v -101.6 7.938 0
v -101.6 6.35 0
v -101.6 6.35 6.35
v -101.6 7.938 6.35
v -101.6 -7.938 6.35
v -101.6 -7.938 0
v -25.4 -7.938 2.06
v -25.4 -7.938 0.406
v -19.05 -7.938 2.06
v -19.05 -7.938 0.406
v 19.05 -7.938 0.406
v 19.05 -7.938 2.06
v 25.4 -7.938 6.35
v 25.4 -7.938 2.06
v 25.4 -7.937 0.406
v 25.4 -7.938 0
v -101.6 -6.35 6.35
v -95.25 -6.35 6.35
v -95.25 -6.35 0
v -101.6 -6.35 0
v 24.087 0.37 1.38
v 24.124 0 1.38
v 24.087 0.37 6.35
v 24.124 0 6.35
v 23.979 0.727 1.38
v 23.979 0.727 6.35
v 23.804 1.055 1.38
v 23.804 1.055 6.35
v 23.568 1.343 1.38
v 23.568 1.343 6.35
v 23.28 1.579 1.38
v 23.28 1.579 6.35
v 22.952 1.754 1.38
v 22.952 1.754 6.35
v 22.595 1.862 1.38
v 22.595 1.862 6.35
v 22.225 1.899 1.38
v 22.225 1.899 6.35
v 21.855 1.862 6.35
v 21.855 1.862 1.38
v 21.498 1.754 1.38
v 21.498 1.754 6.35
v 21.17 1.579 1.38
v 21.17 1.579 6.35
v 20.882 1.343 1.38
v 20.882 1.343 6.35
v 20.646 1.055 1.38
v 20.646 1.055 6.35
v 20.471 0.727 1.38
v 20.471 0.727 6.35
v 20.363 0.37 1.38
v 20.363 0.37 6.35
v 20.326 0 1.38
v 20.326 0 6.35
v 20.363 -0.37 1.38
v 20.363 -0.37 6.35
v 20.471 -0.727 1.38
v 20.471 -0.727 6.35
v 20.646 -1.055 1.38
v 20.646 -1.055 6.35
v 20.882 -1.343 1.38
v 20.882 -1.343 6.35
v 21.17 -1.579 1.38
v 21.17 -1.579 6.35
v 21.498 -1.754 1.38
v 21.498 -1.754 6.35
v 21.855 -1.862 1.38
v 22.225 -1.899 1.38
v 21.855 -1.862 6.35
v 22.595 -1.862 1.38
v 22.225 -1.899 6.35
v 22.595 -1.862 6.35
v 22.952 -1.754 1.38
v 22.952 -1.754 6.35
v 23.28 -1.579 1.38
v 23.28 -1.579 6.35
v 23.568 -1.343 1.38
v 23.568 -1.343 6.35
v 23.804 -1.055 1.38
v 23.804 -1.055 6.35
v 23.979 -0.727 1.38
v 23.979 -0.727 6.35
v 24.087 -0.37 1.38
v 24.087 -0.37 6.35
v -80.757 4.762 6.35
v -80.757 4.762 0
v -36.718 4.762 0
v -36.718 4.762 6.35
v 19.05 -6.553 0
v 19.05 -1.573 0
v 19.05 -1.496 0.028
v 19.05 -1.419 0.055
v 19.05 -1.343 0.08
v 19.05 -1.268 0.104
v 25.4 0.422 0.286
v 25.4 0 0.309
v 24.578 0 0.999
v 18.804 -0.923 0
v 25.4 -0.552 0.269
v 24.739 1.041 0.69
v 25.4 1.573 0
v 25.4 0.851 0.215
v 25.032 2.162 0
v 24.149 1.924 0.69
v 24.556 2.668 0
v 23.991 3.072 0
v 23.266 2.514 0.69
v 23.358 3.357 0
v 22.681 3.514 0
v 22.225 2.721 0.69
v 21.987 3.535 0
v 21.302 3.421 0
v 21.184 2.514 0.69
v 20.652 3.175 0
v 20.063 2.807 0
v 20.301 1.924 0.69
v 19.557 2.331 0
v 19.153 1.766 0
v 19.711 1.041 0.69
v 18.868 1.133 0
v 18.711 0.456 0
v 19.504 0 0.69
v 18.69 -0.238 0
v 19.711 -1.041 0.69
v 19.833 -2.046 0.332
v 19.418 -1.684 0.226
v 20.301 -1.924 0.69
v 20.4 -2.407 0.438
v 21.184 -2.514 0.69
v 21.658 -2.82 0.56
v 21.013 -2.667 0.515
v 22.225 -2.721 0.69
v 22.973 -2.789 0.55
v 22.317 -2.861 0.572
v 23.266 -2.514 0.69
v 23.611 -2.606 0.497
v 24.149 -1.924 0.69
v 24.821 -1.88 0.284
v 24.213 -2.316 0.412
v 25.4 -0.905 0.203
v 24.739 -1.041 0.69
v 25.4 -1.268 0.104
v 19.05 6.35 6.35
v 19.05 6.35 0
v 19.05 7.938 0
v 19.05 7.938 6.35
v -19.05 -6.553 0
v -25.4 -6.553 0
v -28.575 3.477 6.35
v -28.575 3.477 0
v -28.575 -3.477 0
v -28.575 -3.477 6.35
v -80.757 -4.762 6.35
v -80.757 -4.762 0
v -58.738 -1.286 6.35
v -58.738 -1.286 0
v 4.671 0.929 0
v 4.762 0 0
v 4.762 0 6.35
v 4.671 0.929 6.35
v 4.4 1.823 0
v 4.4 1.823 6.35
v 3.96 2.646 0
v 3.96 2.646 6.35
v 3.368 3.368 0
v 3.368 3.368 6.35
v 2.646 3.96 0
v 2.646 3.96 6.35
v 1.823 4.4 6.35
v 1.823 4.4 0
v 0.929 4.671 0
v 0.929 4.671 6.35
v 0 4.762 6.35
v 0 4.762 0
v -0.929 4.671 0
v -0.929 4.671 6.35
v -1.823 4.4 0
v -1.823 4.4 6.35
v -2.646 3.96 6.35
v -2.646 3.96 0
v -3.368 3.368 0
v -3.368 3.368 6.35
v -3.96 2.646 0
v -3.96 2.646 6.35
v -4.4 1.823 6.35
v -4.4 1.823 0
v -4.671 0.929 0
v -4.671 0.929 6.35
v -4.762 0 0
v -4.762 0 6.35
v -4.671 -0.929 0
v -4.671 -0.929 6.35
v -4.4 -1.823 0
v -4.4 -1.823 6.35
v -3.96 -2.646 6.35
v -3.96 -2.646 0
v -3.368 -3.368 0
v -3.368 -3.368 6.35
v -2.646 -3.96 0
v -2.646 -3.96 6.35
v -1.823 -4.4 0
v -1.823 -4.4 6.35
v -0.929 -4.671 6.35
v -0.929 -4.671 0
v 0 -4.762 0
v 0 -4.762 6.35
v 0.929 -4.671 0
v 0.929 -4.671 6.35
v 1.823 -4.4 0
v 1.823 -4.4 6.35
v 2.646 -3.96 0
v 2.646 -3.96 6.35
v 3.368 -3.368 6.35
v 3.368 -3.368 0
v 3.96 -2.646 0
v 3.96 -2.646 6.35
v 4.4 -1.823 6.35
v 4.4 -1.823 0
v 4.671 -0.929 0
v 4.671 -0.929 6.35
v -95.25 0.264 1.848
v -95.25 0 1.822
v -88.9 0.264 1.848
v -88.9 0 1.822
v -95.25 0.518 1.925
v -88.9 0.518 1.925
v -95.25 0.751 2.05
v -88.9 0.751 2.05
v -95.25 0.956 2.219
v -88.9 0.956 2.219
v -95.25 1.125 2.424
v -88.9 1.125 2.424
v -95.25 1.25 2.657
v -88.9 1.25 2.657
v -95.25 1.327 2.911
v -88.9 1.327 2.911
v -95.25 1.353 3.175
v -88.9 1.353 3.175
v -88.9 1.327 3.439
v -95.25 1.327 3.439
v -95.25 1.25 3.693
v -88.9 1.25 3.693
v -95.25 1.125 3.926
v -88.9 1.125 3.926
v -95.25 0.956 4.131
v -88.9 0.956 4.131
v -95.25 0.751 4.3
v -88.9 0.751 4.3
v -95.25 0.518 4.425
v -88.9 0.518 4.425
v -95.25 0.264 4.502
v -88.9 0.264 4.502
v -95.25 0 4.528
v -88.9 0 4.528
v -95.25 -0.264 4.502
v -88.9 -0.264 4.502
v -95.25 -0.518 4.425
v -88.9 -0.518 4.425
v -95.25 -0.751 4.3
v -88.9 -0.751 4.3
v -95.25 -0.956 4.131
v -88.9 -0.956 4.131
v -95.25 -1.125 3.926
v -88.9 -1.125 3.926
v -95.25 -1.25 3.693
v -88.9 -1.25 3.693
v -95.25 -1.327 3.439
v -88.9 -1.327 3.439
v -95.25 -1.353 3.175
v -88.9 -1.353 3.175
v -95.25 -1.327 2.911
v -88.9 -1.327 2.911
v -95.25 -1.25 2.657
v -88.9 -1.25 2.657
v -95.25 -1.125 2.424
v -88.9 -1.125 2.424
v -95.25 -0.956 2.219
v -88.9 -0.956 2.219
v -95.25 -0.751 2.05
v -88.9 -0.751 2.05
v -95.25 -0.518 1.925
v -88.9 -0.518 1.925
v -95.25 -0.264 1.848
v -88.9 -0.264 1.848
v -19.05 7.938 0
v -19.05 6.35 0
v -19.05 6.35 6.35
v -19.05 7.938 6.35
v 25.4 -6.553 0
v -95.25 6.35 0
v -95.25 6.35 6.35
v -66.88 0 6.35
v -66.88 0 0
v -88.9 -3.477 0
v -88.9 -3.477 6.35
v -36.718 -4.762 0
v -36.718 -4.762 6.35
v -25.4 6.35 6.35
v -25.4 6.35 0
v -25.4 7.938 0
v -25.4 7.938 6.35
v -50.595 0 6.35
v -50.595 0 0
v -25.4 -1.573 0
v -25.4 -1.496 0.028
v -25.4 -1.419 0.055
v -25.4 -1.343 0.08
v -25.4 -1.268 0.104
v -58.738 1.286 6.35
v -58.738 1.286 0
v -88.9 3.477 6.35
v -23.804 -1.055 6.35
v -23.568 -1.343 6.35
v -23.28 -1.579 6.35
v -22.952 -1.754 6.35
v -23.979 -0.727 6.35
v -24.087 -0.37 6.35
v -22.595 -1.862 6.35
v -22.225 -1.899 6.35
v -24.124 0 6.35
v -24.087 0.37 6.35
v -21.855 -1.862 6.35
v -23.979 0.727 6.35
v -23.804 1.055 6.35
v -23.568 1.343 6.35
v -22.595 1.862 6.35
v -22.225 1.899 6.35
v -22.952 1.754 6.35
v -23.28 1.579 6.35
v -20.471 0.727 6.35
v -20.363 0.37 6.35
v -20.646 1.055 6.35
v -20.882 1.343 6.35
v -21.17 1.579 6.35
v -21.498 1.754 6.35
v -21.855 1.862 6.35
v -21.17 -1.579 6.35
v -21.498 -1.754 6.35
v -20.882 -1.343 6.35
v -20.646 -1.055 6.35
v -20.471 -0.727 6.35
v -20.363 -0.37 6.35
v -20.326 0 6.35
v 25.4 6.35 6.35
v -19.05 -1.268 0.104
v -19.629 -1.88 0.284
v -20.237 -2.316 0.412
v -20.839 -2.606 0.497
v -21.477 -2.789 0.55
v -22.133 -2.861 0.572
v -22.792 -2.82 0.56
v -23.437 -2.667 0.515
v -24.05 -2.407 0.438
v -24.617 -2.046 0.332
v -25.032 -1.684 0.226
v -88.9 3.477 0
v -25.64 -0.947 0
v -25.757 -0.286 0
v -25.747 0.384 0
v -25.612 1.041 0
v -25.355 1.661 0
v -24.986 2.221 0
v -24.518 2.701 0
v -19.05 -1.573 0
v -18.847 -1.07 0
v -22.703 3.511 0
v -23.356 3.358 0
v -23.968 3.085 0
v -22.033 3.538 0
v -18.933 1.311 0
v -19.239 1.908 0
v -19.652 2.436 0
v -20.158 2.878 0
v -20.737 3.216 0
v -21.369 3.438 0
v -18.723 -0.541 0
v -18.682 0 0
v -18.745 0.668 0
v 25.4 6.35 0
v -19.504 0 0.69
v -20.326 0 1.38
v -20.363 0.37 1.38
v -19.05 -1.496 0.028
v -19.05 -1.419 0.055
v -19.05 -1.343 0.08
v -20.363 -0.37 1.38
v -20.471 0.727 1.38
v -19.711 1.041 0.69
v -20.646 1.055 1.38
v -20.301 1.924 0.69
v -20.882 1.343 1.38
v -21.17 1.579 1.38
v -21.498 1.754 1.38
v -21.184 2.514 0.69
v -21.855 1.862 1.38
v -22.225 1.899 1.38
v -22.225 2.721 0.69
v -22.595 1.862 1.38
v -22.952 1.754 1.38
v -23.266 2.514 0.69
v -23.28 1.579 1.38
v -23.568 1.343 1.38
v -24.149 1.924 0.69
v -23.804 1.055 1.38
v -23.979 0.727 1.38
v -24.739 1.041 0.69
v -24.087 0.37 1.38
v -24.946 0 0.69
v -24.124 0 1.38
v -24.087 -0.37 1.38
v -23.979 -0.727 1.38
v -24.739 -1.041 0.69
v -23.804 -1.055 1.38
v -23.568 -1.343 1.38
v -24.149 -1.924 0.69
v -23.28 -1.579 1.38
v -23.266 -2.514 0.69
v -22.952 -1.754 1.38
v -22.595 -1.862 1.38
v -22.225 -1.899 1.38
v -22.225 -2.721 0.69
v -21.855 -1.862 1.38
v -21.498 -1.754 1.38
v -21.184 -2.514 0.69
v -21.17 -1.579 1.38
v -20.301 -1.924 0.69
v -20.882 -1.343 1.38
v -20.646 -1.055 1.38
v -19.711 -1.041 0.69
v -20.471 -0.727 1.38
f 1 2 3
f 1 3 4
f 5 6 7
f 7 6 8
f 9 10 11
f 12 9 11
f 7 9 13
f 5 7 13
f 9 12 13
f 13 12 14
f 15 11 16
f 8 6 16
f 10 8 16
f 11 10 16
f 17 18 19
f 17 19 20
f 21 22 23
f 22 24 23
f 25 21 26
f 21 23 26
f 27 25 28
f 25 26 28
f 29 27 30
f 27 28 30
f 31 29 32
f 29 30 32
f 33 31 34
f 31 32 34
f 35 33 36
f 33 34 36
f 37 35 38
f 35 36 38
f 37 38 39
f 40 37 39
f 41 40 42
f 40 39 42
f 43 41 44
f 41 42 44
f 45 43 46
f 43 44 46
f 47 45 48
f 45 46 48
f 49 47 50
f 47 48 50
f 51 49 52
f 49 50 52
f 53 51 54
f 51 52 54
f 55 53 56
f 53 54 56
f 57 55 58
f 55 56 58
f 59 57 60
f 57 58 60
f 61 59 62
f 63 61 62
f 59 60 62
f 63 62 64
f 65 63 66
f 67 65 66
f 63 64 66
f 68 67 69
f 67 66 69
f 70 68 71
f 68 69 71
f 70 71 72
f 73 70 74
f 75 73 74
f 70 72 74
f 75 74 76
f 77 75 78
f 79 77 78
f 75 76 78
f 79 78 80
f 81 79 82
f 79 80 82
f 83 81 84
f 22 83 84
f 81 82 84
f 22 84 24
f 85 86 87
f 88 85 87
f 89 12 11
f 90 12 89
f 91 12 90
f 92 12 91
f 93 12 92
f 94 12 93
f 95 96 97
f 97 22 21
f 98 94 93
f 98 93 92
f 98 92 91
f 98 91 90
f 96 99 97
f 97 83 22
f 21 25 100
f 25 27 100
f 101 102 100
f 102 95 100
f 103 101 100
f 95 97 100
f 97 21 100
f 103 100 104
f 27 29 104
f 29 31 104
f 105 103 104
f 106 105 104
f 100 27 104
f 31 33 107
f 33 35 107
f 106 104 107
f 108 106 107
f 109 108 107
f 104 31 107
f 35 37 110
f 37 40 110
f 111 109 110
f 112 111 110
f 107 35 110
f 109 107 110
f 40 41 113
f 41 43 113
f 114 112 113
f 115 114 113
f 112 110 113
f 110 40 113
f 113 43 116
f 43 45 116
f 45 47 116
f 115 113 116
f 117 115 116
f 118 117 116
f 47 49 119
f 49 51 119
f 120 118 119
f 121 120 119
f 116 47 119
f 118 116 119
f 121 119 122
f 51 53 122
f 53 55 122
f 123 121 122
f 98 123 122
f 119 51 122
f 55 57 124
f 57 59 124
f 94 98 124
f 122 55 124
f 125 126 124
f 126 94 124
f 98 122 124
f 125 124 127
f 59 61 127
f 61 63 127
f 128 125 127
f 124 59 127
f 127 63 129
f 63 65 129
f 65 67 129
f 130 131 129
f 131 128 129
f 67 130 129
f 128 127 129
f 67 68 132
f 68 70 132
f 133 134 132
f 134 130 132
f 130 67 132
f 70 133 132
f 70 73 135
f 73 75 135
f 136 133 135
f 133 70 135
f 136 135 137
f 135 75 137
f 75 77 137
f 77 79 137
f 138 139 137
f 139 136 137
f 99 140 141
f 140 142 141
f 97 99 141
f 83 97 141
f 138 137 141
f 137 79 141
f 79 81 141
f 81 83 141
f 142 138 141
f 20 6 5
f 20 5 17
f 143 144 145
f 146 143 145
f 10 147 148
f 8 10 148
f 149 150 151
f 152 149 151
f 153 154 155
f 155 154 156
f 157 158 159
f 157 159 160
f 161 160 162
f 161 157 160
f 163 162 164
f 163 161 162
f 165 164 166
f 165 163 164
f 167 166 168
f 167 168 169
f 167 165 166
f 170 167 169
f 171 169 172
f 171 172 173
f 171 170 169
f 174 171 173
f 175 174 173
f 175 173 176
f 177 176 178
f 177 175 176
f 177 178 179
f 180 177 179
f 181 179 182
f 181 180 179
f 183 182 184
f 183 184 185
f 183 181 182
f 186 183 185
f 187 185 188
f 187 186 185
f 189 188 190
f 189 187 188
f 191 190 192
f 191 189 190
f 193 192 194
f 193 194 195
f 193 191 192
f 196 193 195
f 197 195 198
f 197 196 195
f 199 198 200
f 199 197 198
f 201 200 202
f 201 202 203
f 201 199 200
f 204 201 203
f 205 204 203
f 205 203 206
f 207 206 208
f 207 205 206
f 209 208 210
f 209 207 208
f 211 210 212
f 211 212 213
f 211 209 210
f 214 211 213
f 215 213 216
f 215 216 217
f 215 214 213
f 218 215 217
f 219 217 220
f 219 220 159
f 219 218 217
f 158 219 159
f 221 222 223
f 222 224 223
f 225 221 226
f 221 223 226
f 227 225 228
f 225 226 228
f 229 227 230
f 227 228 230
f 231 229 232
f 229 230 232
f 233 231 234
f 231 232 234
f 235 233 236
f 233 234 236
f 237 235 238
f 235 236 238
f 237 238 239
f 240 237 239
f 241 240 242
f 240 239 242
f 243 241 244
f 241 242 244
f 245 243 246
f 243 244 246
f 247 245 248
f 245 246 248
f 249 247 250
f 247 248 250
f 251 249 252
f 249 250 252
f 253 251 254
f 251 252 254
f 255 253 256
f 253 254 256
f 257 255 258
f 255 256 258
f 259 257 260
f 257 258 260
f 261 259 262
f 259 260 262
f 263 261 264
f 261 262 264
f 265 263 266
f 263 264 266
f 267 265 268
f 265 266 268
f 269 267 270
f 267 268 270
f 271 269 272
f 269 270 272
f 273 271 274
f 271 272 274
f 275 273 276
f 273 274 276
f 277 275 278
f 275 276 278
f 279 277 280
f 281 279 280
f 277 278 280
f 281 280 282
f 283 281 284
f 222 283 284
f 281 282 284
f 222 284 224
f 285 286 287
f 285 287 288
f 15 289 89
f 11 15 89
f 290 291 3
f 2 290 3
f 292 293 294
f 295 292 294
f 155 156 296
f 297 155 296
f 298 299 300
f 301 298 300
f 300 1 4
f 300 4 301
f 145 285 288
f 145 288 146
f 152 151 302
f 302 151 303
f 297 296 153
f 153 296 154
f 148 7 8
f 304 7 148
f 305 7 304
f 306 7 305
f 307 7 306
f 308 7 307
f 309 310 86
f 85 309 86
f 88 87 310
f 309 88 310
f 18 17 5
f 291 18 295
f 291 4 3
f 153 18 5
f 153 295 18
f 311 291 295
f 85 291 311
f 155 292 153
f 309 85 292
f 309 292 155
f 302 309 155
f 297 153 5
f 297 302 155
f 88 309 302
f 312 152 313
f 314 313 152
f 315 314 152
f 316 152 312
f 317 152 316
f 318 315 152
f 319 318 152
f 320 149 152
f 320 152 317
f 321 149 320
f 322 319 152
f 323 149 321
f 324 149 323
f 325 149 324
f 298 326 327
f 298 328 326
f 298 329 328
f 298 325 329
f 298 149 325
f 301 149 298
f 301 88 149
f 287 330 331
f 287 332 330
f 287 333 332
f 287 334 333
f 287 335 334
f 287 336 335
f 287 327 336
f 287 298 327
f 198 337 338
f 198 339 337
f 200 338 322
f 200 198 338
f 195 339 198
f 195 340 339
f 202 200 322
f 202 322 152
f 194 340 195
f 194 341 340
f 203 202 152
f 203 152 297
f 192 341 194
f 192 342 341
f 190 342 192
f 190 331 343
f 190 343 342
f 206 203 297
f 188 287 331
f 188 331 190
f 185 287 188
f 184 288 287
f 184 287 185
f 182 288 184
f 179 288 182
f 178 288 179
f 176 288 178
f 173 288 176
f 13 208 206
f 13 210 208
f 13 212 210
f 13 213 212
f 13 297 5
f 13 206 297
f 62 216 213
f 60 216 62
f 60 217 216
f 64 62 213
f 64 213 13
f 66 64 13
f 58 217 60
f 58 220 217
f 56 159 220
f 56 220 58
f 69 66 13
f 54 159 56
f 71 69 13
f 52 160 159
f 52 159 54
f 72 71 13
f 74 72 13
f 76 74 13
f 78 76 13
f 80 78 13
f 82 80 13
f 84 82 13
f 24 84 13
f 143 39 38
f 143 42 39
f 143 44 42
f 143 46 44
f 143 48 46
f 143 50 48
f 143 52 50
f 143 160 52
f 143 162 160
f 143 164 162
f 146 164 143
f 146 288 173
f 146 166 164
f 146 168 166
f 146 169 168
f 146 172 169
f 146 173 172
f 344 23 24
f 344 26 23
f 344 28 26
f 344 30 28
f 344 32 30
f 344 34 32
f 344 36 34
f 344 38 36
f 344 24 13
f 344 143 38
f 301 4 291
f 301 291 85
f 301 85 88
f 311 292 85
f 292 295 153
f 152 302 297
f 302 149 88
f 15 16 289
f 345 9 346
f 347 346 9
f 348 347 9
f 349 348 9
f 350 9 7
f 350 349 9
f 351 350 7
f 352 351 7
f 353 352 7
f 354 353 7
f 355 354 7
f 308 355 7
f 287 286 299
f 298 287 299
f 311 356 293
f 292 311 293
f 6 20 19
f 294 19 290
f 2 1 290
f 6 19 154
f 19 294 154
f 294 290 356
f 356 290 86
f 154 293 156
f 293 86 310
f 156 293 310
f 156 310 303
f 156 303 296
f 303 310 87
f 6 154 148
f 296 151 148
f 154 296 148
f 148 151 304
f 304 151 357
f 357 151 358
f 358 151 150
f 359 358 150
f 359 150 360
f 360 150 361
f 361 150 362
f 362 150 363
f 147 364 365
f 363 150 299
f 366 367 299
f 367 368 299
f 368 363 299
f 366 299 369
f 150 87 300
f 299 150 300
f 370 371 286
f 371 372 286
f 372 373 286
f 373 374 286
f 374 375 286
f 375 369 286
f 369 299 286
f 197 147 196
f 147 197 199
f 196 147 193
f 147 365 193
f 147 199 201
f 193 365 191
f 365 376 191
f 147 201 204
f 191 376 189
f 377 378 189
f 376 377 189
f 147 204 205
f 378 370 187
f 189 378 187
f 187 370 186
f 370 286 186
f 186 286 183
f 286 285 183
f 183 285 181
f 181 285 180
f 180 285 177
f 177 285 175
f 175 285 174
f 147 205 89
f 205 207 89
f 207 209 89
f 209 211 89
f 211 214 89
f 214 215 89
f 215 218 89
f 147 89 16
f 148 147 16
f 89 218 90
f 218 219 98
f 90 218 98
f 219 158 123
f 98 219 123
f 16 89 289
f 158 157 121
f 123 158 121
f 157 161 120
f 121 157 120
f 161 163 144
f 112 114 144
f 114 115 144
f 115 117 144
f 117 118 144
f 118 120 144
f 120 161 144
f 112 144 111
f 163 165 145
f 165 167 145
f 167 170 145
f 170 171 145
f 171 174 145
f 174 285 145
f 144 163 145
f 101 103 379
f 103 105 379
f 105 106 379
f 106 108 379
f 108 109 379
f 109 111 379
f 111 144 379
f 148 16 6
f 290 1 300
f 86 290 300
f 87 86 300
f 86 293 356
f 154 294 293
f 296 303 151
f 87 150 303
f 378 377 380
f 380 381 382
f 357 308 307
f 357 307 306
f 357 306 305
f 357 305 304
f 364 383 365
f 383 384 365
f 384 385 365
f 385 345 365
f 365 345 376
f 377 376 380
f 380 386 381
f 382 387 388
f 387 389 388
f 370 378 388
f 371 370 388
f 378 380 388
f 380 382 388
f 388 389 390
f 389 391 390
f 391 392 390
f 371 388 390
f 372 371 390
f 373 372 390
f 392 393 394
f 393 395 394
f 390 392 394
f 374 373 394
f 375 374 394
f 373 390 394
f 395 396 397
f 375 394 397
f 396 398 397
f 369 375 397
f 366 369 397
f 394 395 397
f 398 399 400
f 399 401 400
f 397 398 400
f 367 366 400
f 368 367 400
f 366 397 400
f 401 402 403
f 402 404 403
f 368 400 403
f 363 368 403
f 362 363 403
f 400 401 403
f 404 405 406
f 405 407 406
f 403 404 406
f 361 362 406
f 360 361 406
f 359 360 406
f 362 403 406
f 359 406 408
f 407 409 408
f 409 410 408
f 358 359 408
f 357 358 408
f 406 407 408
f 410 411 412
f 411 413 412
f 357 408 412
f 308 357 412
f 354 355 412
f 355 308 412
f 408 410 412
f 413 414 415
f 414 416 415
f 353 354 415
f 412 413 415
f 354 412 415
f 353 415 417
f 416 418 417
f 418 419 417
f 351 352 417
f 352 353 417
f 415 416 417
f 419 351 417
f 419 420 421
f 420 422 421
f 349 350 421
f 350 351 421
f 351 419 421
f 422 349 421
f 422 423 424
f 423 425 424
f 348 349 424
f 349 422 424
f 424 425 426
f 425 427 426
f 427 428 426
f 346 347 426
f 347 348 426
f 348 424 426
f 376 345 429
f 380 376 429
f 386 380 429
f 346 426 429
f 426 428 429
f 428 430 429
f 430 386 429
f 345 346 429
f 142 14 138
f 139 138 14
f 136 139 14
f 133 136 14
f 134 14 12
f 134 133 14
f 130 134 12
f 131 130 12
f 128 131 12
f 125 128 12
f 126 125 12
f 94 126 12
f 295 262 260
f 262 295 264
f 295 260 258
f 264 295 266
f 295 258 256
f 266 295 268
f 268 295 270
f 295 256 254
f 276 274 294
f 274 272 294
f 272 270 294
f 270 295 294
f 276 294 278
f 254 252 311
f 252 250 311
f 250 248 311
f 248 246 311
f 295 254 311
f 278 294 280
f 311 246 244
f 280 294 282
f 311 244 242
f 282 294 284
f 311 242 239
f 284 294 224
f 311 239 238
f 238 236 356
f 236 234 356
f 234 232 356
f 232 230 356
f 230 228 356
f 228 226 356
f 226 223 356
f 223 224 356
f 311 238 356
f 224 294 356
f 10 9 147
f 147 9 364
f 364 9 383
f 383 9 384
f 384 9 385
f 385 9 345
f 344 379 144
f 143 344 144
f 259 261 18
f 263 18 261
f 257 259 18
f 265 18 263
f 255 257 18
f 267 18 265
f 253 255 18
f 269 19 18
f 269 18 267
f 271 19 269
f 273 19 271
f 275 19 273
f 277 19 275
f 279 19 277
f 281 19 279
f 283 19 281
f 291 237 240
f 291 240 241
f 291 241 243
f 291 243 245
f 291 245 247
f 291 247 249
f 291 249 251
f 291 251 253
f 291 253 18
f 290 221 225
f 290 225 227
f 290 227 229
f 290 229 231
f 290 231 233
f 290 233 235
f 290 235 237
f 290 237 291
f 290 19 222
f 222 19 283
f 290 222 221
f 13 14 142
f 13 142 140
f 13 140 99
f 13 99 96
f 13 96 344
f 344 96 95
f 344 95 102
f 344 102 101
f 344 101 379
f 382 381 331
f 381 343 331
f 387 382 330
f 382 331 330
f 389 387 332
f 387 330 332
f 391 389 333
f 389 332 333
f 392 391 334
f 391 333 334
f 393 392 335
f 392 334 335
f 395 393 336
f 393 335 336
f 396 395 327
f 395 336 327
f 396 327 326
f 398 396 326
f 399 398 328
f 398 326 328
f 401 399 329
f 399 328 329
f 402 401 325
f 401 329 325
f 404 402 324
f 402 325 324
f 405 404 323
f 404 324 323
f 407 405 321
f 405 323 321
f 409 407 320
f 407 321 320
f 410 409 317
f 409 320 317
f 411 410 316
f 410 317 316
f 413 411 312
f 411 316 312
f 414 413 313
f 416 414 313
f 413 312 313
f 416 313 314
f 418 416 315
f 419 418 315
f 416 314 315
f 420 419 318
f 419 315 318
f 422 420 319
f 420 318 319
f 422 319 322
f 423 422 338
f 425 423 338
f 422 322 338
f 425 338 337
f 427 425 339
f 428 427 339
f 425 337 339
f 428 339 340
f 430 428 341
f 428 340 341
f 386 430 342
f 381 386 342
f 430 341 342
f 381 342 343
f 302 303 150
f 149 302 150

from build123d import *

# Parameters (mm, degrees)
SKETCH1_W                                         = 127
SKETCH1_H                                         = 15.875
SKETCH1_R                                         = 4.7625
BOSS_EXTRUDE1_DEPTH                               = 6.35
CSK_FOR_6_FLAT_HEAD_MACHINE_SCREW_100_D           = 3.7973
CSK_FOR_6_FLAT_HEAD_MACHINE_SCREW_100_CSINK_D     = 7.0866
CSK_FOR_6_FLAT_HEAD_MACHINE_SCREW_100_CSINK_ANGLE = 100
SKETCH5_W                                         = 6.35
SKETCH5_H                                         = 12.7
CUT_EXTRUDE1_DEPTH                                = 103.107229941
SKETCH6_W                                         = 6.35
SKETCH6_H                                         = 1.5875
CUT_EXTRUDE2_DEPTH                                = 103.107229941
TAP_DRILL_FOR_6_32_TAP1_D                         = 2.7051
TAP_DRILL_FOR_6_32_TAP1_DEPTH                     = 6.35
TAP_DRILL_FOR_6_32_TAP1_TIP                       = 0.81269403


with BuildPart() as part:
    # Sketch1 → Boss-Extrude1 (new body)
    with BuildSketch(Plane.XY):
        with Locations((-38.1, 0)):
            Rectangle(SKETCH1_W, SKETCH1_H)
        Polygon((-88.9, 3.476766434), (-66.880479253, 0), (-88.9, -3.476766434), align=None, mode=Mode.SUBTRACT)
        Polygon((-80.757020747, -4.7625), (-58.7375, -1.285733566), (-36.717979253, -4.7625), align=None, mode=Mode.SUBTRACT)
        Polygon((-28.575, -3.476766434), (-50.594520747, 0), (-28.575, 3.476766434), align=None, mode=Mode.SUBTRACT)
        Polygon((-36.717979253, 4.7625), (-58.7375, 1.285733566), (-80.757020747, 4.7625), align=None, mode=Mode.SUBTRACT)
        Circle(SKETCH1_R, mode=Mode.SUBTRACT)
    extrude(amount=BOSS_EXTRUDE1_DEPTH)

    # CSK for #6 Flat Head Machine Screw (100)1 (through all)
    with Locations(Plane(origin=(0, 0, 0), x_dir=(-1, 0, 0), z_dir=(0, 0, -1))):
        with Locations((-22.225, 0), (22.225, 0)):
            CounterSinkHole(CSK_FOR_6_FLAT_HEAD_MACHINE_SCREW_100_D / 2, CSK_FOR_6_FLAT_HEAD_MACHINE_SCREW_100_CSINK_D / 2, counter_sink_angle=CSK_FOR_6_FLAT_HEAD_MACHINE_SCREW_100_CSINK_ANGLE)

    # Sketch5 → Cut-Extrude1 (cut, through all)
    with BuildSketch(Plane(origin=(0, 0, 0), x_dir=(-1, 0, 0), z_dir=(0, 0, -1))):
        with Locations((98.425, 0)):
            Rectangle(SKETCH5_W, SKETCH5_H)
    extrude(amount=-CUT_EXTRUDE1_DEPTH, mode=Mode.SUBTRACT)

    # Sketch6 → Cut-Extrude2 (cut, through all)
    with BuildSketch(Plane(origin=(0, 0, 0), x_dir=(-1, 0, 0), z_dir=(0, 0, -1))):
        with Locations((22.225, 7.14375)):
            Rectangle(SKETCH6_W, SKETCH6_H)
        with Locations((-22.225, 7.14375)):
            Rectangle(SKETCH6_W, SKETCH6_H)
    cut_extrude2 = extrude(amount=-CUT_EXTRUDE2_DEPTH, mode=Mode.SUBTRACT)

    # Mirror3: Cut-Extrude2 across plane
    add(cut_extrude2.mirror(Plane(origin=(0, 3.046697428, 2.281546151), x_dir=(0, -0.5994152204724752, 0.8004382508763147), z_dir=(0, -0.8004382508763147, -0.5994152204724751))), mode=Mode.SUBTRACT)

    # Tap Drill for #6-32 Tap1
    with Locations(Plane.ZY.offset(95.25)):
        with Locations((3.175, 0)):
            Hole(TAP_DRILL_FOR_6_32_TAP1_D / 2, depth=TAP_DRILL_FOR_6_32_TAP1_DEPTH)
            with Locations((0, 0, -(TAP_DRILL_FOR_6_32_TAP1_DEPTH + TAP_DRILL_FOR_6_32_TAP1_TIP / 2))):  # 118° drill point
                Cone(0, TAP_DRILL_FOR_6_32_TAP1_D / 2, TAP_DRILL_FOR_6_32_TAP1_TIP, mode=Mode.SUBTRACT)


solid = part.part
